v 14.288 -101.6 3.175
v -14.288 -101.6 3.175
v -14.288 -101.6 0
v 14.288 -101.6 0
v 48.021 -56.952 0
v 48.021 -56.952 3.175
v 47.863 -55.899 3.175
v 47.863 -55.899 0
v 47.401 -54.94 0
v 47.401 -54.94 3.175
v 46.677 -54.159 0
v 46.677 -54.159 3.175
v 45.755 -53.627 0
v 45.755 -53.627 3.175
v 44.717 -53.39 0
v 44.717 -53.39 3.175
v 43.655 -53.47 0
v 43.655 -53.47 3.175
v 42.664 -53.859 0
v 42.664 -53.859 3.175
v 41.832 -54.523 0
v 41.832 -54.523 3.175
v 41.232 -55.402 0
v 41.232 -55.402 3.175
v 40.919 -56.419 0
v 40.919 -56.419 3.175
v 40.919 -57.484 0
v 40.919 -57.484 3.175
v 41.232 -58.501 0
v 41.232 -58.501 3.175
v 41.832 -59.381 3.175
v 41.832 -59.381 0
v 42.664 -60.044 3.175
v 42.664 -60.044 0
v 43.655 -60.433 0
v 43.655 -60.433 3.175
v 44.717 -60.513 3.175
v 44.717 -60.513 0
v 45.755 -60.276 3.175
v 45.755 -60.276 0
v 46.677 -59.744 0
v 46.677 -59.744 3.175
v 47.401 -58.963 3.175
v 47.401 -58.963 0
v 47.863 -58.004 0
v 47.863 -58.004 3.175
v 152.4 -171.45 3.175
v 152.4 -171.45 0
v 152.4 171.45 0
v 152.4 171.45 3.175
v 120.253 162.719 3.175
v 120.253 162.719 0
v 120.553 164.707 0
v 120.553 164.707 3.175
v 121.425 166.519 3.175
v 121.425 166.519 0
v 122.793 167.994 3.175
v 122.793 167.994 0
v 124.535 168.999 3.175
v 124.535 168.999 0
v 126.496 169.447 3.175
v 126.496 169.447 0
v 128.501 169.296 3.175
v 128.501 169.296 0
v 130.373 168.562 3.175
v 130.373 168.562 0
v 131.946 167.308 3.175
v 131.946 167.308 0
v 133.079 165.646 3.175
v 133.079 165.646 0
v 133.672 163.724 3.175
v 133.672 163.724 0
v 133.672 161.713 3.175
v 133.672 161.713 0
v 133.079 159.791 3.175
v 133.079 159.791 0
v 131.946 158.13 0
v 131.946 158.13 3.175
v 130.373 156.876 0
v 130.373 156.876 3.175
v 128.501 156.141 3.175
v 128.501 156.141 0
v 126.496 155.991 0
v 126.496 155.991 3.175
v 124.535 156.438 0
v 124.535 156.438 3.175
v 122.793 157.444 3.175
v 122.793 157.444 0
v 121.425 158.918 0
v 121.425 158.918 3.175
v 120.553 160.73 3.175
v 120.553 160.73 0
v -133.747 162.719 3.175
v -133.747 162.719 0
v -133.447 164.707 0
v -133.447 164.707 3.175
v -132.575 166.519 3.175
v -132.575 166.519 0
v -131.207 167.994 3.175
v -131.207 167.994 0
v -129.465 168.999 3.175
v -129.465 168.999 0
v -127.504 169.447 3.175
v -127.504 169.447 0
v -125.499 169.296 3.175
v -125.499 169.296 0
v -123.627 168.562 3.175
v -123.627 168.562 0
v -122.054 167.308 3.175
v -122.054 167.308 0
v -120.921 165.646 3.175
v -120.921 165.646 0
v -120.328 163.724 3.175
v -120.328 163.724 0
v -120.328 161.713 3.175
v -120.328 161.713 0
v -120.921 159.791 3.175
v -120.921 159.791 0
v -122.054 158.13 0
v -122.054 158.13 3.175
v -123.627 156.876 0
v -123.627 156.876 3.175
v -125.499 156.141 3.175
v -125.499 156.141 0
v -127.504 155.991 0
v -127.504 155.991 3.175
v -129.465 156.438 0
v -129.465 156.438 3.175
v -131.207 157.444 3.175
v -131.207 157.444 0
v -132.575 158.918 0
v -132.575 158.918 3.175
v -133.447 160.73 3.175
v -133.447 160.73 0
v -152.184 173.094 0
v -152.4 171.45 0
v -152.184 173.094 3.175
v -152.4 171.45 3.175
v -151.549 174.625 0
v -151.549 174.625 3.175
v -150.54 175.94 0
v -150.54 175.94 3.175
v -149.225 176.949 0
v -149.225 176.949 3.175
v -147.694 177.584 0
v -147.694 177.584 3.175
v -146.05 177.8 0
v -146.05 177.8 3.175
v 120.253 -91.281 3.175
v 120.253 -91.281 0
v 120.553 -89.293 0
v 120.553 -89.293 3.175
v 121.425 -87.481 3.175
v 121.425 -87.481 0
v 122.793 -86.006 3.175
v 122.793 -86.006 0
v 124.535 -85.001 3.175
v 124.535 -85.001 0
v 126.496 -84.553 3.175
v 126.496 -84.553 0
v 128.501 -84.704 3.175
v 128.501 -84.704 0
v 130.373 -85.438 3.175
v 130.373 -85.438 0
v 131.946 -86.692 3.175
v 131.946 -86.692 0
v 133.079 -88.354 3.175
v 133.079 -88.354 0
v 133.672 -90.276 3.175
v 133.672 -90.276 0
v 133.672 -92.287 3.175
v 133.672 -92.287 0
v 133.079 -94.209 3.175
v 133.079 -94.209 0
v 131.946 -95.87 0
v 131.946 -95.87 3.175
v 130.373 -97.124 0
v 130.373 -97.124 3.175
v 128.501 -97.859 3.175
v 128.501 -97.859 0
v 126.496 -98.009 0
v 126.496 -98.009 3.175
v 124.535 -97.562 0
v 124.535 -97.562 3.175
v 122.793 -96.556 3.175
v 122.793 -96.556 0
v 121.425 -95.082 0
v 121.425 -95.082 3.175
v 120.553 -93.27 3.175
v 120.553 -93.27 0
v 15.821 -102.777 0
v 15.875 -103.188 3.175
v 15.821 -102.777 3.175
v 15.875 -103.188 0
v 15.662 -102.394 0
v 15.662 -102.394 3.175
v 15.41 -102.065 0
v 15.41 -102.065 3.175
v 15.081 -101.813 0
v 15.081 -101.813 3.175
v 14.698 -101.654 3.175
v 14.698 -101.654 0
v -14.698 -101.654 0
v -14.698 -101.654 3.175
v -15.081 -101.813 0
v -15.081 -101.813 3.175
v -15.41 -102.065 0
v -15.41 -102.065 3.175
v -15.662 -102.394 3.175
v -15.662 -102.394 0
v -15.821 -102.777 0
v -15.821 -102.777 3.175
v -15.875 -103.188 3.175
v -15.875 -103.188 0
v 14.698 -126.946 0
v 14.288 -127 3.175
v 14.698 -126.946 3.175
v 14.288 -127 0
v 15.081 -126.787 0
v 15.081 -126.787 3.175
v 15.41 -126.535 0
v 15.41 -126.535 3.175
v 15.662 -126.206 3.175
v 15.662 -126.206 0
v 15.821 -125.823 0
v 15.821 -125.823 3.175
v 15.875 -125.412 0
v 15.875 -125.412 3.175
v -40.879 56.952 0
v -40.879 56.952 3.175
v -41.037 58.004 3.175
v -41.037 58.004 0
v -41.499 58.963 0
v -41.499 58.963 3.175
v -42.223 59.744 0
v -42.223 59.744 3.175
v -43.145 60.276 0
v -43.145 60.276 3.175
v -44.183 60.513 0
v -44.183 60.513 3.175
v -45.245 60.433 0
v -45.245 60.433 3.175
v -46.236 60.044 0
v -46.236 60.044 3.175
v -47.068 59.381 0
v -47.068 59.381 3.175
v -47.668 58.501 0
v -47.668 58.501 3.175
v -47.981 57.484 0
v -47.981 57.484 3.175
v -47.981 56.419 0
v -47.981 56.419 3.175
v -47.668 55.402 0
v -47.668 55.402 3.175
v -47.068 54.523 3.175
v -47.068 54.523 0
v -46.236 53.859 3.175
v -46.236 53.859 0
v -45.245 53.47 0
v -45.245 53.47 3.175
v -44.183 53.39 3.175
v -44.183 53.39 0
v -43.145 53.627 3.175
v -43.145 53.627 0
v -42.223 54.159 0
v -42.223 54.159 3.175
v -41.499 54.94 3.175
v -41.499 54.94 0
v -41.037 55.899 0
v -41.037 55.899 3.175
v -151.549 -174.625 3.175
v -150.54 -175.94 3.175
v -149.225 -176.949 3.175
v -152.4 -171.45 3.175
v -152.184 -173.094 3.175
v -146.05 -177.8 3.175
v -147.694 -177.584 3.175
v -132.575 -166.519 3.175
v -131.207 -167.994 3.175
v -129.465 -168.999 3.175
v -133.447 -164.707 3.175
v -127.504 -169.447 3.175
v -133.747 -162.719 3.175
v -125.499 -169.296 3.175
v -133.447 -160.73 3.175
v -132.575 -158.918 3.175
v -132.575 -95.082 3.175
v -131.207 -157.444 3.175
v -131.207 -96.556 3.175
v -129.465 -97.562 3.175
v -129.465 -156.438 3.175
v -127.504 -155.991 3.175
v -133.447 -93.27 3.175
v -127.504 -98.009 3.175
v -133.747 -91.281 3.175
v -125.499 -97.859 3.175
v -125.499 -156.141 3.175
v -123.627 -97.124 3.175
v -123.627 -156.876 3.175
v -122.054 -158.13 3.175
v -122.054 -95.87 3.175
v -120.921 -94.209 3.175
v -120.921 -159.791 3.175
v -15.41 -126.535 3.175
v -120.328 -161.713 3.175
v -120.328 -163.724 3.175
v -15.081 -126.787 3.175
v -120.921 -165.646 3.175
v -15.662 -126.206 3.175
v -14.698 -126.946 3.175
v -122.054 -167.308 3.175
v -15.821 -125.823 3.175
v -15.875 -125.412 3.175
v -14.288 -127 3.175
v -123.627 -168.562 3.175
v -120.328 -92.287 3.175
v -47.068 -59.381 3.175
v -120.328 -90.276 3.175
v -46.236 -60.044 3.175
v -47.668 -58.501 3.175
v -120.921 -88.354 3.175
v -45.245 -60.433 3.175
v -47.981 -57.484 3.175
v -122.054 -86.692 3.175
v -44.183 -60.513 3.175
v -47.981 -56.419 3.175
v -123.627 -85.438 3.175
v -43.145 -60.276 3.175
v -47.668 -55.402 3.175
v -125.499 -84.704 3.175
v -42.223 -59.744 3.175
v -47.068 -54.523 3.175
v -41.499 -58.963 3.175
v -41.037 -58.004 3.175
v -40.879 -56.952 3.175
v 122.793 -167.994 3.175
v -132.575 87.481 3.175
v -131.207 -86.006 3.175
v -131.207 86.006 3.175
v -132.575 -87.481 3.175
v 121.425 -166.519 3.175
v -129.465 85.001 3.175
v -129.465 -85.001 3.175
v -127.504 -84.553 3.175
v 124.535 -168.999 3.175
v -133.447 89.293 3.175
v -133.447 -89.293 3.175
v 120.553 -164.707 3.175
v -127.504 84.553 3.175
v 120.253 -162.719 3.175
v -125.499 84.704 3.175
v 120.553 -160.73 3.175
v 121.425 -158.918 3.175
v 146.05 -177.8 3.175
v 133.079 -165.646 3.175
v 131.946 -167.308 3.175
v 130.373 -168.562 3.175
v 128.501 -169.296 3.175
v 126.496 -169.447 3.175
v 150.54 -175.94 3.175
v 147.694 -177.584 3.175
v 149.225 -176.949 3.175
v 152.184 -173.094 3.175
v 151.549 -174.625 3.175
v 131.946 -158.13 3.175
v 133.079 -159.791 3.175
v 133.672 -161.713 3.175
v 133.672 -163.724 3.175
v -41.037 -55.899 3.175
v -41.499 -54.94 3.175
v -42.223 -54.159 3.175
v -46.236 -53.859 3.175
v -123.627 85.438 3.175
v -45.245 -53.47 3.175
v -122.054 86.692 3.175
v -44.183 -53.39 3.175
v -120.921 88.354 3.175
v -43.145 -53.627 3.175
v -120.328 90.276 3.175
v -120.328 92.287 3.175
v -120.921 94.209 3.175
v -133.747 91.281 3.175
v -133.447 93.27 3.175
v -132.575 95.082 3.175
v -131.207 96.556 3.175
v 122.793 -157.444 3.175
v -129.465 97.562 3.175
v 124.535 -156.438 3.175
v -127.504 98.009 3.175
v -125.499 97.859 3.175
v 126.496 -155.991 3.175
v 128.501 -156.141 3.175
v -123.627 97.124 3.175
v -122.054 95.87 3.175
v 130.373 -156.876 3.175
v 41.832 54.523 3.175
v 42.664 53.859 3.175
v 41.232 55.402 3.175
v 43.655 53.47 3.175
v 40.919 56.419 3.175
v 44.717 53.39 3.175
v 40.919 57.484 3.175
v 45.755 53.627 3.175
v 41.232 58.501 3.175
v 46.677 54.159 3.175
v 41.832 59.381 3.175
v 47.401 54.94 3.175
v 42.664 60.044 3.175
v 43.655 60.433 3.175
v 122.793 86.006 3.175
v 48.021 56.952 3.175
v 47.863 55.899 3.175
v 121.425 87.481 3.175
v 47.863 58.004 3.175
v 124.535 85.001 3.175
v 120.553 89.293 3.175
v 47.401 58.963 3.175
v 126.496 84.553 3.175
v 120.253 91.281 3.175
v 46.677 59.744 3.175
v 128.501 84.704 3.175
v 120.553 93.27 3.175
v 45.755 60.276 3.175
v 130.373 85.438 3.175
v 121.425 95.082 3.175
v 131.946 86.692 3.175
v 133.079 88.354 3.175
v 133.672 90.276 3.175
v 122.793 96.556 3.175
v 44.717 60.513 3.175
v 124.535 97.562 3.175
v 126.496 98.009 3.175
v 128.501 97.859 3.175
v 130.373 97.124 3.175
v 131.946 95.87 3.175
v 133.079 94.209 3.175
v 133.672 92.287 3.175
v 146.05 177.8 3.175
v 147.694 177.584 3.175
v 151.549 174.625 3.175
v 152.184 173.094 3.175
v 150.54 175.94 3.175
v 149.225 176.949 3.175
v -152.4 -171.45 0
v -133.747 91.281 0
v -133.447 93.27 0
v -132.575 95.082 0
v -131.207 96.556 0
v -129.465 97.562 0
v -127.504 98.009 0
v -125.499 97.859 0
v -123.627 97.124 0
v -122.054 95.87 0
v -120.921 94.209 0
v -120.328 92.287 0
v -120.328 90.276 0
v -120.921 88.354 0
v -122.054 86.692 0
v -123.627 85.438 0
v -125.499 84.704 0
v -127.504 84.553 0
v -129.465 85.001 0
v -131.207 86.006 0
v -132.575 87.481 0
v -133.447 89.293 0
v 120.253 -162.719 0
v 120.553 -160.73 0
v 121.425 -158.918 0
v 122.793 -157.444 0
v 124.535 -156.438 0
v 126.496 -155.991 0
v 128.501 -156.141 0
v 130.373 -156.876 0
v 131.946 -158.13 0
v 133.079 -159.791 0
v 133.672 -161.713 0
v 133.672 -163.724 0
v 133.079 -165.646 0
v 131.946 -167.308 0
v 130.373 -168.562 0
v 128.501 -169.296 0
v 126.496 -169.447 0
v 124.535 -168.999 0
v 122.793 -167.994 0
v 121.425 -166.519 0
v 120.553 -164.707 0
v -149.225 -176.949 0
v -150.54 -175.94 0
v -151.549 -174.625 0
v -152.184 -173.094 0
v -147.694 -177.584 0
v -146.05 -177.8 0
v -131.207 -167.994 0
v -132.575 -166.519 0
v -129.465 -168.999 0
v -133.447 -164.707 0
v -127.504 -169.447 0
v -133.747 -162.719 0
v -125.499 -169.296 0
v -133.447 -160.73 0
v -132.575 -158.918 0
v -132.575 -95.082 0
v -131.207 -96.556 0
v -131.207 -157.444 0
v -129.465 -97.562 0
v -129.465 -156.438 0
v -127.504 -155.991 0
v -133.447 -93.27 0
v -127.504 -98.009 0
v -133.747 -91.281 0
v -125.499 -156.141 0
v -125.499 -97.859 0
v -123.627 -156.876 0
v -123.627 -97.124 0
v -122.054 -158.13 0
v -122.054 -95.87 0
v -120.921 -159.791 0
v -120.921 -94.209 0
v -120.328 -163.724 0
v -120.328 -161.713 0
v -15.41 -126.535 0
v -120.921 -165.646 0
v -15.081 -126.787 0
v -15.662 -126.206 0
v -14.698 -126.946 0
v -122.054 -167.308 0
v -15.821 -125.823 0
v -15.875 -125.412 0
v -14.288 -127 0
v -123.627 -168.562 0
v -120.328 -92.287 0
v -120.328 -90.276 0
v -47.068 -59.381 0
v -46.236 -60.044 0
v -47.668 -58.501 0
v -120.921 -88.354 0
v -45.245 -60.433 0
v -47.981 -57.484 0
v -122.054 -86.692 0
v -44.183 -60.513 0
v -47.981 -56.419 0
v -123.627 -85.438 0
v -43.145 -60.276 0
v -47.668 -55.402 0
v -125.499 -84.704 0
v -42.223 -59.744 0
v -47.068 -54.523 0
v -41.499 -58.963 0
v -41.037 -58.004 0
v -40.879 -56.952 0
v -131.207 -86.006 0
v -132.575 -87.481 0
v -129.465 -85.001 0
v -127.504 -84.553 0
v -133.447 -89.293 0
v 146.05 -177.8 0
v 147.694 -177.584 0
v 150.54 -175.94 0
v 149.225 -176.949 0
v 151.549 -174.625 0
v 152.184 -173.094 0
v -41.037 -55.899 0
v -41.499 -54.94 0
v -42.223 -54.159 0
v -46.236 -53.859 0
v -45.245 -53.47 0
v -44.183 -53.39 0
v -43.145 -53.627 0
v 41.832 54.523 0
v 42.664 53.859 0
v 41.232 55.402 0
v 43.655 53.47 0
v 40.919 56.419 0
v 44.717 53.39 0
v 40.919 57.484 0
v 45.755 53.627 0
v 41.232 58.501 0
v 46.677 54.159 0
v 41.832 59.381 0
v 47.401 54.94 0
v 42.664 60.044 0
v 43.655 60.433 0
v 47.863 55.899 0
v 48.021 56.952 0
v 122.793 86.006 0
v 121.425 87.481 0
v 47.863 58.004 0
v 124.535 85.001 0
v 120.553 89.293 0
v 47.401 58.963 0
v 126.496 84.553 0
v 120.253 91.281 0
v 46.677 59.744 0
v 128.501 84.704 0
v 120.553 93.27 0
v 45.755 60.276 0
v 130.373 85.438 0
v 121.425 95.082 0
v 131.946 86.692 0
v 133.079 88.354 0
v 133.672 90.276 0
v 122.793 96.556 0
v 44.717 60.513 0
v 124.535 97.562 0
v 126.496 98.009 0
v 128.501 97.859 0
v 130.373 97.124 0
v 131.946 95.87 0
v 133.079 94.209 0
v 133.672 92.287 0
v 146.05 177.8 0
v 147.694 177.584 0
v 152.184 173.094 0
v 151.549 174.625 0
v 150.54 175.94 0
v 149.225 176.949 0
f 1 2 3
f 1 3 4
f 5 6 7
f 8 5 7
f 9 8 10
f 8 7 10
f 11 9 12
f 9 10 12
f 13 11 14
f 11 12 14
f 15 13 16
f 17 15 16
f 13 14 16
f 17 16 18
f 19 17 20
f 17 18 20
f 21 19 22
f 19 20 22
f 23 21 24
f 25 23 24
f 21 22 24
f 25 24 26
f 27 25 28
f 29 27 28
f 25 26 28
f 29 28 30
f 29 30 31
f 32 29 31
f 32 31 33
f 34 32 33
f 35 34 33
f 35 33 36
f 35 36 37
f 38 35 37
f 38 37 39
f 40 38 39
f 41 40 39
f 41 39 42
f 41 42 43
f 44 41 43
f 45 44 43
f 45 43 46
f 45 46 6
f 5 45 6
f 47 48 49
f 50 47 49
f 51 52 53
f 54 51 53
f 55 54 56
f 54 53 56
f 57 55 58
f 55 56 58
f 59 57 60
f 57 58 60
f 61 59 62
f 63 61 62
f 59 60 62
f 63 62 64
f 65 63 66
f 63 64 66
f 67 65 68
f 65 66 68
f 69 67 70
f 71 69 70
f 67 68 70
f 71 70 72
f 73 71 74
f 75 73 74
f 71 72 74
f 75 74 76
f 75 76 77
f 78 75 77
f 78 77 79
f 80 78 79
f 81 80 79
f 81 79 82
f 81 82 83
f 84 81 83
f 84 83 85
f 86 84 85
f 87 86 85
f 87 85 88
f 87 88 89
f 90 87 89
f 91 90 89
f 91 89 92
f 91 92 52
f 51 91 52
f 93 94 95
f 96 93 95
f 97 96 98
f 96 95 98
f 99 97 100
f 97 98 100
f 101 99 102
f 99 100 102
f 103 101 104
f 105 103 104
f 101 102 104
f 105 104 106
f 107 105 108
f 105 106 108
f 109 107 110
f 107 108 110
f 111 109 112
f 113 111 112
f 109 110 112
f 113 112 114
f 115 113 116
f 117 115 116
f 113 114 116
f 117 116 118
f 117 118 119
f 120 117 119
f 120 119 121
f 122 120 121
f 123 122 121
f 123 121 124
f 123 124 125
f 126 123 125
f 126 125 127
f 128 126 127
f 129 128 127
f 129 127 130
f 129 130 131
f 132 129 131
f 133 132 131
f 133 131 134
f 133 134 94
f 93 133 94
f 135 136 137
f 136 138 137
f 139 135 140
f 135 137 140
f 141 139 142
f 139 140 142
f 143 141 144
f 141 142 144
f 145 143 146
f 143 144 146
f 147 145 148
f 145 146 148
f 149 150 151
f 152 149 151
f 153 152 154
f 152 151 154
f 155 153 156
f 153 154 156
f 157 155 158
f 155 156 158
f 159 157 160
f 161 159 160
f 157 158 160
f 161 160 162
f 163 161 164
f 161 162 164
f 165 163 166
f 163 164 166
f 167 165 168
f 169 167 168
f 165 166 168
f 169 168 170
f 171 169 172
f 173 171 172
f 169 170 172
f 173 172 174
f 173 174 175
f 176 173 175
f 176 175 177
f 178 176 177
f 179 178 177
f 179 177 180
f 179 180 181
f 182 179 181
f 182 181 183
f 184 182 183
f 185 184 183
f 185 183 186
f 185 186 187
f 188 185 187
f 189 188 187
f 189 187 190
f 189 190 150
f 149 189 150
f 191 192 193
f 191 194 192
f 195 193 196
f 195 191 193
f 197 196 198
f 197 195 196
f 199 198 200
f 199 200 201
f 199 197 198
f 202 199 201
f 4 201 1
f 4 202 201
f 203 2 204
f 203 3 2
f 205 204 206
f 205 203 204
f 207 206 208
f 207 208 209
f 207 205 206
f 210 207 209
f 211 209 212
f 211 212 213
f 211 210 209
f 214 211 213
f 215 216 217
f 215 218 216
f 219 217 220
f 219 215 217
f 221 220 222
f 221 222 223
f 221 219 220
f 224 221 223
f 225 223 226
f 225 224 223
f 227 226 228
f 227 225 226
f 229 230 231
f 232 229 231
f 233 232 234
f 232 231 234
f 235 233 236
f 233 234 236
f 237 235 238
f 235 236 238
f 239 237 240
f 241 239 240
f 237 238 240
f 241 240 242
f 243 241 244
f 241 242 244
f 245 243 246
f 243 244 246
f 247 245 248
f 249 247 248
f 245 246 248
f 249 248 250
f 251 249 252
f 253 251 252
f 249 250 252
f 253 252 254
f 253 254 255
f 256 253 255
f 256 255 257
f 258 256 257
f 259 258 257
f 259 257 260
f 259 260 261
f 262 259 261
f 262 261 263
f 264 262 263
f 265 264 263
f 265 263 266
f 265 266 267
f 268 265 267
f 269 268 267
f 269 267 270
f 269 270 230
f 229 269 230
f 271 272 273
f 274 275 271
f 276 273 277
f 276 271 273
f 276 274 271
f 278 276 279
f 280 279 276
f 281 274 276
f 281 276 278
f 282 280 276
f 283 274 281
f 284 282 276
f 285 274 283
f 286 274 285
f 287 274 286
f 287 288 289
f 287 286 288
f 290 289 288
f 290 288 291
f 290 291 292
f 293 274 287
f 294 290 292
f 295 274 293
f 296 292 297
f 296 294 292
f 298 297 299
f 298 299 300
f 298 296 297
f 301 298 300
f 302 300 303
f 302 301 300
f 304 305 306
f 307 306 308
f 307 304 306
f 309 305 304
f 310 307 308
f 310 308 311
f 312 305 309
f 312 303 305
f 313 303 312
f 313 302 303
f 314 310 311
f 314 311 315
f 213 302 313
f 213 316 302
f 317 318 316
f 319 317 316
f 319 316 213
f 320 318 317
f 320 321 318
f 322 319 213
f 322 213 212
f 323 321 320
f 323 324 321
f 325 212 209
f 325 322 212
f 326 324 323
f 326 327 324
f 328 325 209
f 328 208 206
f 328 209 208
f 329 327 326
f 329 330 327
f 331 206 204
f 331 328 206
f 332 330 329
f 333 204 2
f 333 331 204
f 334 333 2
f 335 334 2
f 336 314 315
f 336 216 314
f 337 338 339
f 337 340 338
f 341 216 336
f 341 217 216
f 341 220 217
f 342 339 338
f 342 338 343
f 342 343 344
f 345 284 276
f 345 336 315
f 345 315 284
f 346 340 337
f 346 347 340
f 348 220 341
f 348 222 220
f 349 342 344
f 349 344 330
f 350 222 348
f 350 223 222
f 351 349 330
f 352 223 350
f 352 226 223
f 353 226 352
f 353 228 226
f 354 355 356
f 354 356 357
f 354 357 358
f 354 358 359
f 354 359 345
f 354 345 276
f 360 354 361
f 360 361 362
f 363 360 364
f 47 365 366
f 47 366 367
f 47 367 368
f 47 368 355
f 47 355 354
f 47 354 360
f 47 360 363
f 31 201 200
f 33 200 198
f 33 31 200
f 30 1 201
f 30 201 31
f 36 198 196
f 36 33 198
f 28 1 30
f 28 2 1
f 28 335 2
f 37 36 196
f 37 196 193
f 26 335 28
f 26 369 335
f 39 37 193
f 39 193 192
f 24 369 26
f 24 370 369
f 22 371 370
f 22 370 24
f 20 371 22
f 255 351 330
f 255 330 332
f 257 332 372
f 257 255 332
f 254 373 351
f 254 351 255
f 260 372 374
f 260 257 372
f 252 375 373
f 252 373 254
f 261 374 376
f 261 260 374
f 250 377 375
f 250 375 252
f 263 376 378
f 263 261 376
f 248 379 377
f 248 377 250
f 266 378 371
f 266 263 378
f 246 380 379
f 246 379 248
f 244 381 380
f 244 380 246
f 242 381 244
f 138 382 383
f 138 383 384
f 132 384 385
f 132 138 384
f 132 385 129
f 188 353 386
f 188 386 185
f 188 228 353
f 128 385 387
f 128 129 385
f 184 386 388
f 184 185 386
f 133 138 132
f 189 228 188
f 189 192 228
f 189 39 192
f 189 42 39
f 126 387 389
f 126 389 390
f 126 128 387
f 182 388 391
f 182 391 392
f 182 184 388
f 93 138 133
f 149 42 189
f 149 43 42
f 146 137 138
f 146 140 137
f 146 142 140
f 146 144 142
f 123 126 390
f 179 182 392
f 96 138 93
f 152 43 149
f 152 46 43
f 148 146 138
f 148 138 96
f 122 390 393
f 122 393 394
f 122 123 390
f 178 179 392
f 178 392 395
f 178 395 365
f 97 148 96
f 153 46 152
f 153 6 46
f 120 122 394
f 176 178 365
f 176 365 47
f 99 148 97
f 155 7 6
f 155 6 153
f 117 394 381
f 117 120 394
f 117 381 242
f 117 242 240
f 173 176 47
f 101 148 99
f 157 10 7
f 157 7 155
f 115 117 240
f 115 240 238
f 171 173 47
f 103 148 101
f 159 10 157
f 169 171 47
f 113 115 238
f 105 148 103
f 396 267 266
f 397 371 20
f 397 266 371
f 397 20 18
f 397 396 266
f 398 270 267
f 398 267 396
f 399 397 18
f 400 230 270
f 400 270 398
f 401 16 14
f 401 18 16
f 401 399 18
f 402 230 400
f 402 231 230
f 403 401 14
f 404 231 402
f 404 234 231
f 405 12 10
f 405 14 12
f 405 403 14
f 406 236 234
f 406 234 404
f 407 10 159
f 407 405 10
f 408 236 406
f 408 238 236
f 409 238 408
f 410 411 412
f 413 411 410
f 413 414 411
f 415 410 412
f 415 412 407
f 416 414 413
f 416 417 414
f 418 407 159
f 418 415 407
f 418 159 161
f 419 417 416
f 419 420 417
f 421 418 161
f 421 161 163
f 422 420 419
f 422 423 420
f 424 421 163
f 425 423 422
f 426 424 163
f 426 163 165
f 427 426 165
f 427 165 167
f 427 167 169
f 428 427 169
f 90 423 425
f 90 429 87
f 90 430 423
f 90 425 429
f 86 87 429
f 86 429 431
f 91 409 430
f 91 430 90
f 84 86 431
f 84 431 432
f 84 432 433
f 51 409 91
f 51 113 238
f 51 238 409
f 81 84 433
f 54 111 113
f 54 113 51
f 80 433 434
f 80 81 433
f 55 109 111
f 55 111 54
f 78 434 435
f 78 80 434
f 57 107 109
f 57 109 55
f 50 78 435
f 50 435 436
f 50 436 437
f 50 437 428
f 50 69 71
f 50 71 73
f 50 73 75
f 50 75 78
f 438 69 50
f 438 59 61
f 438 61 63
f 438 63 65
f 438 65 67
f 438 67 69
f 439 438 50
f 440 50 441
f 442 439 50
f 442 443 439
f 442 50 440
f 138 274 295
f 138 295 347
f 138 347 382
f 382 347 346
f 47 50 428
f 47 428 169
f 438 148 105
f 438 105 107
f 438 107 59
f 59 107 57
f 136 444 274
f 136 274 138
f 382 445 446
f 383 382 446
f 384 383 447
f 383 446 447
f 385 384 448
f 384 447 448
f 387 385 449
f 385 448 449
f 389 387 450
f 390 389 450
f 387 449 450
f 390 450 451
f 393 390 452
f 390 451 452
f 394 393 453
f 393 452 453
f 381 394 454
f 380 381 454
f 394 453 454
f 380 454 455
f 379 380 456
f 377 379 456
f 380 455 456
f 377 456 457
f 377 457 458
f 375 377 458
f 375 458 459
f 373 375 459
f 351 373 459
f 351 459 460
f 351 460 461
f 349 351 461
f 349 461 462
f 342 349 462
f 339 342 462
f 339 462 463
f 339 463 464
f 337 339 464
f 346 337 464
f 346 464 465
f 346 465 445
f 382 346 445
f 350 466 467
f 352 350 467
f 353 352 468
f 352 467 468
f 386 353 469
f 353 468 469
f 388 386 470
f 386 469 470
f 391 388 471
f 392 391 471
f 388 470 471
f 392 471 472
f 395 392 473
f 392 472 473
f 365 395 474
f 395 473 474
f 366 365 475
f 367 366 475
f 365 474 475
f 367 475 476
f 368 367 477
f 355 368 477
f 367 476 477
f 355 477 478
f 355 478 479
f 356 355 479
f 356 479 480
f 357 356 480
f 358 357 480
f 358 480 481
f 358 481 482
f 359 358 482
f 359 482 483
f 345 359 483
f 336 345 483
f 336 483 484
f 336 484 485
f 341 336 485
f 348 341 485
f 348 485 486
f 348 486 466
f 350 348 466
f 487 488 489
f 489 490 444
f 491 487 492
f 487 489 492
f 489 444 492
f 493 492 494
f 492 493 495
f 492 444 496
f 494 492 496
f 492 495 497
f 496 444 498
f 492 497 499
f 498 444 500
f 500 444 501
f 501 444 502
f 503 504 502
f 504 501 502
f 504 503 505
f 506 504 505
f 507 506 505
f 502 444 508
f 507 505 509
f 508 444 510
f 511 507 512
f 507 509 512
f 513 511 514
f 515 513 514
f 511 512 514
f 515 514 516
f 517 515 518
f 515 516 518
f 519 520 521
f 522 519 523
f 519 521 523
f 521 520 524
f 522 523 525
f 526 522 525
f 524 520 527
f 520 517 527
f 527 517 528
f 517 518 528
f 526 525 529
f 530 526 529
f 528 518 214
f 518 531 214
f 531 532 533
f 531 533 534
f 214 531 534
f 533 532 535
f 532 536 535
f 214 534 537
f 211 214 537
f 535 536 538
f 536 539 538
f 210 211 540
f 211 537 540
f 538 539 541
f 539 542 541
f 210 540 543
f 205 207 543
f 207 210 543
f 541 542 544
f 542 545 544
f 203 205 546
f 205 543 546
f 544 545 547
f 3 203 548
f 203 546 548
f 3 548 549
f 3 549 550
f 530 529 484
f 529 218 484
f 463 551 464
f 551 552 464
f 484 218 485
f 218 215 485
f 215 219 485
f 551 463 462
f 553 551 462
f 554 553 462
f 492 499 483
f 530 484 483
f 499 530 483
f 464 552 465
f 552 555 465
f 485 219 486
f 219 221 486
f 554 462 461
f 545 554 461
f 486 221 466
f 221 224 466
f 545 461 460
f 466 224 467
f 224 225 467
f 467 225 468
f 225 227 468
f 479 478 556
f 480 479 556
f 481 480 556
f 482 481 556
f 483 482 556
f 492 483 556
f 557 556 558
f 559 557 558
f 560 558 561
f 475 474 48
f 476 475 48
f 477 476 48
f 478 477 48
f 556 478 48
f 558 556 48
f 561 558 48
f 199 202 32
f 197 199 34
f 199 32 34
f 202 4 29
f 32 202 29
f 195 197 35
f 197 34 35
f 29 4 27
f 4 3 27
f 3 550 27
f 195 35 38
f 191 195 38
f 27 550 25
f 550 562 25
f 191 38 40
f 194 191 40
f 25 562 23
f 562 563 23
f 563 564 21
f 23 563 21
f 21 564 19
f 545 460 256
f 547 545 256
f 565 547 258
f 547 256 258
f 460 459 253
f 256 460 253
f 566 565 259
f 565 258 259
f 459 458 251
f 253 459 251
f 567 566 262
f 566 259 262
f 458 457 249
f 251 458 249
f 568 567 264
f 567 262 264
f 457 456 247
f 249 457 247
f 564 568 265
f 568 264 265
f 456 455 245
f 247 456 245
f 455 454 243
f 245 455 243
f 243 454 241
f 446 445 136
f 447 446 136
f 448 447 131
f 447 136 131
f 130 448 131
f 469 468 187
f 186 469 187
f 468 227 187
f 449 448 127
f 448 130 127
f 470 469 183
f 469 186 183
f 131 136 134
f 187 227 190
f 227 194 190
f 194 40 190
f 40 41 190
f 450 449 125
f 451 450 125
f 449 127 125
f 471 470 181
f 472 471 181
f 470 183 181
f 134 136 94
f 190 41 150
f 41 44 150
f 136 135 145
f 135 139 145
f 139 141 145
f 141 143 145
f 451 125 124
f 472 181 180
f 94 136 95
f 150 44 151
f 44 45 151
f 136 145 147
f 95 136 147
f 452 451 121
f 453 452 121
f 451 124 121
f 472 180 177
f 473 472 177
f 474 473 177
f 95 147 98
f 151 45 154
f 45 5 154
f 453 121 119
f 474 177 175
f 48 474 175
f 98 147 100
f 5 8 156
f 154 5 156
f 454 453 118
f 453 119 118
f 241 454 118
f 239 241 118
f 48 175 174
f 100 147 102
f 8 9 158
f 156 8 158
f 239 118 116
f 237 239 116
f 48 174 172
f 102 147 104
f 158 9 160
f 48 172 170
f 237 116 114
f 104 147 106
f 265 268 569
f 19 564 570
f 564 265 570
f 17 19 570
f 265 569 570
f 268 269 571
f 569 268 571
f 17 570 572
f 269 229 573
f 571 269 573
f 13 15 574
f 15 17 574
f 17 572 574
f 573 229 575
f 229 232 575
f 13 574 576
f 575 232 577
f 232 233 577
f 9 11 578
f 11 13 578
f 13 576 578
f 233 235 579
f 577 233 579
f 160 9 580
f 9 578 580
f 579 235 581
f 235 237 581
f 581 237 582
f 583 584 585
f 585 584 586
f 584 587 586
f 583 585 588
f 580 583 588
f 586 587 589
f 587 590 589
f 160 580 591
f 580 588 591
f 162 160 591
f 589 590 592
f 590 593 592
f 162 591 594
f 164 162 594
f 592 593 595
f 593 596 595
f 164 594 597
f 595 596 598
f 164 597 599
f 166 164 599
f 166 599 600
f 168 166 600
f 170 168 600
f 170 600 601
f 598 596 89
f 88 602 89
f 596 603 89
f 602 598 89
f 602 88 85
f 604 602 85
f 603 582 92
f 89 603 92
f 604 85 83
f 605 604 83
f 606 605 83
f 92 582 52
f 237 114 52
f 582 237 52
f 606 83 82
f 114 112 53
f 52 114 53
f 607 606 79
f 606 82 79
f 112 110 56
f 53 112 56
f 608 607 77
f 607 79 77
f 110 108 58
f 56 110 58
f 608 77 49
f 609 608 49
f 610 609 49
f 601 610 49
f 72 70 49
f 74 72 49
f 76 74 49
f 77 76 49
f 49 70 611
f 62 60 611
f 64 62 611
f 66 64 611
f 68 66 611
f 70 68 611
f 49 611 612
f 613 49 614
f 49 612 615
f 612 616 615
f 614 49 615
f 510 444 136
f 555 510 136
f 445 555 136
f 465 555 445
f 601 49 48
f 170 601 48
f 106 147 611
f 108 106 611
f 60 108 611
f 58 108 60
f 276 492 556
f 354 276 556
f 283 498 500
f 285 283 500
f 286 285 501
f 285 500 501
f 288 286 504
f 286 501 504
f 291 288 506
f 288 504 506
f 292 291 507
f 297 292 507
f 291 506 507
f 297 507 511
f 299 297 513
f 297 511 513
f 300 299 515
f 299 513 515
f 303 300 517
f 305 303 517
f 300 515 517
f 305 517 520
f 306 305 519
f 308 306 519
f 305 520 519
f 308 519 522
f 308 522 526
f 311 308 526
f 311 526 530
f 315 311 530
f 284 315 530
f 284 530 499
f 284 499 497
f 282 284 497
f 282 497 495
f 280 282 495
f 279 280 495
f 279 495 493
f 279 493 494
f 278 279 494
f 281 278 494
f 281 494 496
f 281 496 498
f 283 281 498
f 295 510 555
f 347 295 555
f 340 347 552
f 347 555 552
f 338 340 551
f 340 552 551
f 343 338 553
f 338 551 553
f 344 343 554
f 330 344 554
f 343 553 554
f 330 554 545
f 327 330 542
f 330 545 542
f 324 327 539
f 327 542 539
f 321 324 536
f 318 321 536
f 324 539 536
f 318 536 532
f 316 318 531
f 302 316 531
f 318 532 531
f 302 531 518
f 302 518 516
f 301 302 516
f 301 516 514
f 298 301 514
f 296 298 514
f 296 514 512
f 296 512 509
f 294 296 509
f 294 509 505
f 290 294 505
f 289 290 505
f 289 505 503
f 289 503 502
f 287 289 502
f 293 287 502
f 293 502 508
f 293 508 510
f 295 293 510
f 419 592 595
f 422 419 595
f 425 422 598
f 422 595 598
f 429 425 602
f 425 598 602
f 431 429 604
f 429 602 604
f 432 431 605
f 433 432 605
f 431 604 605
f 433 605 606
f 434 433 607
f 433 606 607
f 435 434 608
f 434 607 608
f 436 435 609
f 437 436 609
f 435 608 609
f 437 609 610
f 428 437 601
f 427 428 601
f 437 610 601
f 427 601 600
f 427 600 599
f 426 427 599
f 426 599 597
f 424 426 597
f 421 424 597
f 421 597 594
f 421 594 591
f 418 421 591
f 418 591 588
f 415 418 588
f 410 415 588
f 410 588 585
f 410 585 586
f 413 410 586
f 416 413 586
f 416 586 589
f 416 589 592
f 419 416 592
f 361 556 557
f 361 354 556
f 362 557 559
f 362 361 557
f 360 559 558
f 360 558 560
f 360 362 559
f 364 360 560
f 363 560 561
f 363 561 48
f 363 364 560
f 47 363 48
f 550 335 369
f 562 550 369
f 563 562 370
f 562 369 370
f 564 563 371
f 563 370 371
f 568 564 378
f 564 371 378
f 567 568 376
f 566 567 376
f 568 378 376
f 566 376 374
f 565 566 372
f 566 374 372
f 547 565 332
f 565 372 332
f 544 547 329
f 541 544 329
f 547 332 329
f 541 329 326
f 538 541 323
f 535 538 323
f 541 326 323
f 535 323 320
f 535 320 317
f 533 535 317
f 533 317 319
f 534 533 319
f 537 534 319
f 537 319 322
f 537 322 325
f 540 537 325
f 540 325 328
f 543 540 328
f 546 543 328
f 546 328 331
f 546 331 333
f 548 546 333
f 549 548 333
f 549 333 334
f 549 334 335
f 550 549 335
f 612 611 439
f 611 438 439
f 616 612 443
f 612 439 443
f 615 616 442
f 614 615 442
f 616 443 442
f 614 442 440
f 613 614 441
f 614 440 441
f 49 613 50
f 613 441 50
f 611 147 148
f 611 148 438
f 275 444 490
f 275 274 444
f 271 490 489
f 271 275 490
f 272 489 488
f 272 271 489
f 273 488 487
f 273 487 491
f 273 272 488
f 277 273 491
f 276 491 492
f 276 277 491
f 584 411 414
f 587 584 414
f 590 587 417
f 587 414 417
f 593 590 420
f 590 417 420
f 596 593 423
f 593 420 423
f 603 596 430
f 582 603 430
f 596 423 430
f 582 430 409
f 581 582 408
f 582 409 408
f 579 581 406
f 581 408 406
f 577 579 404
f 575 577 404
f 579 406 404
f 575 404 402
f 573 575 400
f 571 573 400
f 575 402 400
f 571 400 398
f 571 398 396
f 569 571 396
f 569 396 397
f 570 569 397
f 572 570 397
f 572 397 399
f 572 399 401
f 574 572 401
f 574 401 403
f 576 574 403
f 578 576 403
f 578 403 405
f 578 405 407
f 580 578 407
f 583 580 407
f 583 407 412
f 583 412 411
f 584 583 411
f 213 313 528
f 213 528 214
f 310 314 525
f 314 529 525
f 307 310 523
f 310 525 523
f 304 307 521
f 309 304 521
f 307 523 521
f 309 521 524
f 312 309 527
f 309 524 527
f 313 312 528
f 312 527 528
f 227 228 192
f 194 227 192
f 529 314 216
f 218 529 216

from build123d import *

# Parameters (mm, degrees)
SKETCH1_W                        = 304.8
SKETCH1_H                        = 355.6
BOSS_EXTRUDE1_DEPTH              = 3.175
F_17_32_0_53125_DIAMETER_HOLE1_D = 13.49375
FILLET1_R                        = 6.35
F_1_4_CLEARANCE_HOLE1_D          = 7.14248
SKETCH2_W                        = 31.75
SKETCH2_H                        = 25.4
CUT_EXTRUDE1_DEPTH               = 4.175
FILLET2_R                        = 1.5875


with BuildPart() as part:
    # Sketch1 → Boss-Extrude1 (new body)
    with BuildSketch(Plane.XY):
        Rectangle(SKETCH1_W, SKETCH1_H)
    extrude(amount=BOSS_EXTRUDE1_DEPTH)

    # 17/32 (0.53125) Diameter Hole1 (through all)
    with Locations(Plane.XY.offset(3.175)):
        with Locations((-127, 162.71875), (-127, 91.28125), (-127, -91.28125), (-127, -162.71875), (127, -162.71875), (127, -91.28125), (127, 91.28125), (127, 162.71875)):
            Hole(F_17_32_0_53125_DIAMETER_HOLE1_D / 2)

    # Fillet1
    fillet1_edges = [part.edges().sort_by_distance(p)[0] for p in [
        (152.4, -177.8, 1.5875),
        (-152.4, -177.8, 1.5875),
        (-152.4, 177.8, 1.5875),
        (152.4, 177.8, 1.5875),
    ]]
    fillet(fillet1_edges, radius=FILLET1_R)

    # 1/4 Clearance Hole1 (through all)
    with Locations(Plane(origin=(0, 0, 0), x_dir=(-1, 0, 0), z_dir=(0, 0, -1))):
        with Locations((-44.45, 56.9515625), (-44.45, -56.9515625), (44.45, 56.9515625), (44.45, -56.9515625)):
            Hole(F_1_4_CLEARANCE_HOLE1_D / 2)

    # Sketch2 → Cut-Extrude1 (cut, through all)
    with BuildSketch(Plane.XY.offset(3.175)):
        with Locations((0, -114.3)):
            Rectangle(SKETCH2_W, SKETCH2_H)
    extrude(amount=-CUT_EXTRUDE1_DEPTH, mode=Mode.SUBTRACT)

    # Fillet2
    fillet2_edges = [part.edges().sort_by_distance(p)[0] for p in [
        (-15.875, -101.6, 1.5875),
        (15.875, -101.6, 1.5875),
        (15.875, -127, 1.5875),
        (-15.875, -127, 1.5875),
    ]]
    fillet(fillet2_edges, radius=FILLET2_R)


solid = part.part
